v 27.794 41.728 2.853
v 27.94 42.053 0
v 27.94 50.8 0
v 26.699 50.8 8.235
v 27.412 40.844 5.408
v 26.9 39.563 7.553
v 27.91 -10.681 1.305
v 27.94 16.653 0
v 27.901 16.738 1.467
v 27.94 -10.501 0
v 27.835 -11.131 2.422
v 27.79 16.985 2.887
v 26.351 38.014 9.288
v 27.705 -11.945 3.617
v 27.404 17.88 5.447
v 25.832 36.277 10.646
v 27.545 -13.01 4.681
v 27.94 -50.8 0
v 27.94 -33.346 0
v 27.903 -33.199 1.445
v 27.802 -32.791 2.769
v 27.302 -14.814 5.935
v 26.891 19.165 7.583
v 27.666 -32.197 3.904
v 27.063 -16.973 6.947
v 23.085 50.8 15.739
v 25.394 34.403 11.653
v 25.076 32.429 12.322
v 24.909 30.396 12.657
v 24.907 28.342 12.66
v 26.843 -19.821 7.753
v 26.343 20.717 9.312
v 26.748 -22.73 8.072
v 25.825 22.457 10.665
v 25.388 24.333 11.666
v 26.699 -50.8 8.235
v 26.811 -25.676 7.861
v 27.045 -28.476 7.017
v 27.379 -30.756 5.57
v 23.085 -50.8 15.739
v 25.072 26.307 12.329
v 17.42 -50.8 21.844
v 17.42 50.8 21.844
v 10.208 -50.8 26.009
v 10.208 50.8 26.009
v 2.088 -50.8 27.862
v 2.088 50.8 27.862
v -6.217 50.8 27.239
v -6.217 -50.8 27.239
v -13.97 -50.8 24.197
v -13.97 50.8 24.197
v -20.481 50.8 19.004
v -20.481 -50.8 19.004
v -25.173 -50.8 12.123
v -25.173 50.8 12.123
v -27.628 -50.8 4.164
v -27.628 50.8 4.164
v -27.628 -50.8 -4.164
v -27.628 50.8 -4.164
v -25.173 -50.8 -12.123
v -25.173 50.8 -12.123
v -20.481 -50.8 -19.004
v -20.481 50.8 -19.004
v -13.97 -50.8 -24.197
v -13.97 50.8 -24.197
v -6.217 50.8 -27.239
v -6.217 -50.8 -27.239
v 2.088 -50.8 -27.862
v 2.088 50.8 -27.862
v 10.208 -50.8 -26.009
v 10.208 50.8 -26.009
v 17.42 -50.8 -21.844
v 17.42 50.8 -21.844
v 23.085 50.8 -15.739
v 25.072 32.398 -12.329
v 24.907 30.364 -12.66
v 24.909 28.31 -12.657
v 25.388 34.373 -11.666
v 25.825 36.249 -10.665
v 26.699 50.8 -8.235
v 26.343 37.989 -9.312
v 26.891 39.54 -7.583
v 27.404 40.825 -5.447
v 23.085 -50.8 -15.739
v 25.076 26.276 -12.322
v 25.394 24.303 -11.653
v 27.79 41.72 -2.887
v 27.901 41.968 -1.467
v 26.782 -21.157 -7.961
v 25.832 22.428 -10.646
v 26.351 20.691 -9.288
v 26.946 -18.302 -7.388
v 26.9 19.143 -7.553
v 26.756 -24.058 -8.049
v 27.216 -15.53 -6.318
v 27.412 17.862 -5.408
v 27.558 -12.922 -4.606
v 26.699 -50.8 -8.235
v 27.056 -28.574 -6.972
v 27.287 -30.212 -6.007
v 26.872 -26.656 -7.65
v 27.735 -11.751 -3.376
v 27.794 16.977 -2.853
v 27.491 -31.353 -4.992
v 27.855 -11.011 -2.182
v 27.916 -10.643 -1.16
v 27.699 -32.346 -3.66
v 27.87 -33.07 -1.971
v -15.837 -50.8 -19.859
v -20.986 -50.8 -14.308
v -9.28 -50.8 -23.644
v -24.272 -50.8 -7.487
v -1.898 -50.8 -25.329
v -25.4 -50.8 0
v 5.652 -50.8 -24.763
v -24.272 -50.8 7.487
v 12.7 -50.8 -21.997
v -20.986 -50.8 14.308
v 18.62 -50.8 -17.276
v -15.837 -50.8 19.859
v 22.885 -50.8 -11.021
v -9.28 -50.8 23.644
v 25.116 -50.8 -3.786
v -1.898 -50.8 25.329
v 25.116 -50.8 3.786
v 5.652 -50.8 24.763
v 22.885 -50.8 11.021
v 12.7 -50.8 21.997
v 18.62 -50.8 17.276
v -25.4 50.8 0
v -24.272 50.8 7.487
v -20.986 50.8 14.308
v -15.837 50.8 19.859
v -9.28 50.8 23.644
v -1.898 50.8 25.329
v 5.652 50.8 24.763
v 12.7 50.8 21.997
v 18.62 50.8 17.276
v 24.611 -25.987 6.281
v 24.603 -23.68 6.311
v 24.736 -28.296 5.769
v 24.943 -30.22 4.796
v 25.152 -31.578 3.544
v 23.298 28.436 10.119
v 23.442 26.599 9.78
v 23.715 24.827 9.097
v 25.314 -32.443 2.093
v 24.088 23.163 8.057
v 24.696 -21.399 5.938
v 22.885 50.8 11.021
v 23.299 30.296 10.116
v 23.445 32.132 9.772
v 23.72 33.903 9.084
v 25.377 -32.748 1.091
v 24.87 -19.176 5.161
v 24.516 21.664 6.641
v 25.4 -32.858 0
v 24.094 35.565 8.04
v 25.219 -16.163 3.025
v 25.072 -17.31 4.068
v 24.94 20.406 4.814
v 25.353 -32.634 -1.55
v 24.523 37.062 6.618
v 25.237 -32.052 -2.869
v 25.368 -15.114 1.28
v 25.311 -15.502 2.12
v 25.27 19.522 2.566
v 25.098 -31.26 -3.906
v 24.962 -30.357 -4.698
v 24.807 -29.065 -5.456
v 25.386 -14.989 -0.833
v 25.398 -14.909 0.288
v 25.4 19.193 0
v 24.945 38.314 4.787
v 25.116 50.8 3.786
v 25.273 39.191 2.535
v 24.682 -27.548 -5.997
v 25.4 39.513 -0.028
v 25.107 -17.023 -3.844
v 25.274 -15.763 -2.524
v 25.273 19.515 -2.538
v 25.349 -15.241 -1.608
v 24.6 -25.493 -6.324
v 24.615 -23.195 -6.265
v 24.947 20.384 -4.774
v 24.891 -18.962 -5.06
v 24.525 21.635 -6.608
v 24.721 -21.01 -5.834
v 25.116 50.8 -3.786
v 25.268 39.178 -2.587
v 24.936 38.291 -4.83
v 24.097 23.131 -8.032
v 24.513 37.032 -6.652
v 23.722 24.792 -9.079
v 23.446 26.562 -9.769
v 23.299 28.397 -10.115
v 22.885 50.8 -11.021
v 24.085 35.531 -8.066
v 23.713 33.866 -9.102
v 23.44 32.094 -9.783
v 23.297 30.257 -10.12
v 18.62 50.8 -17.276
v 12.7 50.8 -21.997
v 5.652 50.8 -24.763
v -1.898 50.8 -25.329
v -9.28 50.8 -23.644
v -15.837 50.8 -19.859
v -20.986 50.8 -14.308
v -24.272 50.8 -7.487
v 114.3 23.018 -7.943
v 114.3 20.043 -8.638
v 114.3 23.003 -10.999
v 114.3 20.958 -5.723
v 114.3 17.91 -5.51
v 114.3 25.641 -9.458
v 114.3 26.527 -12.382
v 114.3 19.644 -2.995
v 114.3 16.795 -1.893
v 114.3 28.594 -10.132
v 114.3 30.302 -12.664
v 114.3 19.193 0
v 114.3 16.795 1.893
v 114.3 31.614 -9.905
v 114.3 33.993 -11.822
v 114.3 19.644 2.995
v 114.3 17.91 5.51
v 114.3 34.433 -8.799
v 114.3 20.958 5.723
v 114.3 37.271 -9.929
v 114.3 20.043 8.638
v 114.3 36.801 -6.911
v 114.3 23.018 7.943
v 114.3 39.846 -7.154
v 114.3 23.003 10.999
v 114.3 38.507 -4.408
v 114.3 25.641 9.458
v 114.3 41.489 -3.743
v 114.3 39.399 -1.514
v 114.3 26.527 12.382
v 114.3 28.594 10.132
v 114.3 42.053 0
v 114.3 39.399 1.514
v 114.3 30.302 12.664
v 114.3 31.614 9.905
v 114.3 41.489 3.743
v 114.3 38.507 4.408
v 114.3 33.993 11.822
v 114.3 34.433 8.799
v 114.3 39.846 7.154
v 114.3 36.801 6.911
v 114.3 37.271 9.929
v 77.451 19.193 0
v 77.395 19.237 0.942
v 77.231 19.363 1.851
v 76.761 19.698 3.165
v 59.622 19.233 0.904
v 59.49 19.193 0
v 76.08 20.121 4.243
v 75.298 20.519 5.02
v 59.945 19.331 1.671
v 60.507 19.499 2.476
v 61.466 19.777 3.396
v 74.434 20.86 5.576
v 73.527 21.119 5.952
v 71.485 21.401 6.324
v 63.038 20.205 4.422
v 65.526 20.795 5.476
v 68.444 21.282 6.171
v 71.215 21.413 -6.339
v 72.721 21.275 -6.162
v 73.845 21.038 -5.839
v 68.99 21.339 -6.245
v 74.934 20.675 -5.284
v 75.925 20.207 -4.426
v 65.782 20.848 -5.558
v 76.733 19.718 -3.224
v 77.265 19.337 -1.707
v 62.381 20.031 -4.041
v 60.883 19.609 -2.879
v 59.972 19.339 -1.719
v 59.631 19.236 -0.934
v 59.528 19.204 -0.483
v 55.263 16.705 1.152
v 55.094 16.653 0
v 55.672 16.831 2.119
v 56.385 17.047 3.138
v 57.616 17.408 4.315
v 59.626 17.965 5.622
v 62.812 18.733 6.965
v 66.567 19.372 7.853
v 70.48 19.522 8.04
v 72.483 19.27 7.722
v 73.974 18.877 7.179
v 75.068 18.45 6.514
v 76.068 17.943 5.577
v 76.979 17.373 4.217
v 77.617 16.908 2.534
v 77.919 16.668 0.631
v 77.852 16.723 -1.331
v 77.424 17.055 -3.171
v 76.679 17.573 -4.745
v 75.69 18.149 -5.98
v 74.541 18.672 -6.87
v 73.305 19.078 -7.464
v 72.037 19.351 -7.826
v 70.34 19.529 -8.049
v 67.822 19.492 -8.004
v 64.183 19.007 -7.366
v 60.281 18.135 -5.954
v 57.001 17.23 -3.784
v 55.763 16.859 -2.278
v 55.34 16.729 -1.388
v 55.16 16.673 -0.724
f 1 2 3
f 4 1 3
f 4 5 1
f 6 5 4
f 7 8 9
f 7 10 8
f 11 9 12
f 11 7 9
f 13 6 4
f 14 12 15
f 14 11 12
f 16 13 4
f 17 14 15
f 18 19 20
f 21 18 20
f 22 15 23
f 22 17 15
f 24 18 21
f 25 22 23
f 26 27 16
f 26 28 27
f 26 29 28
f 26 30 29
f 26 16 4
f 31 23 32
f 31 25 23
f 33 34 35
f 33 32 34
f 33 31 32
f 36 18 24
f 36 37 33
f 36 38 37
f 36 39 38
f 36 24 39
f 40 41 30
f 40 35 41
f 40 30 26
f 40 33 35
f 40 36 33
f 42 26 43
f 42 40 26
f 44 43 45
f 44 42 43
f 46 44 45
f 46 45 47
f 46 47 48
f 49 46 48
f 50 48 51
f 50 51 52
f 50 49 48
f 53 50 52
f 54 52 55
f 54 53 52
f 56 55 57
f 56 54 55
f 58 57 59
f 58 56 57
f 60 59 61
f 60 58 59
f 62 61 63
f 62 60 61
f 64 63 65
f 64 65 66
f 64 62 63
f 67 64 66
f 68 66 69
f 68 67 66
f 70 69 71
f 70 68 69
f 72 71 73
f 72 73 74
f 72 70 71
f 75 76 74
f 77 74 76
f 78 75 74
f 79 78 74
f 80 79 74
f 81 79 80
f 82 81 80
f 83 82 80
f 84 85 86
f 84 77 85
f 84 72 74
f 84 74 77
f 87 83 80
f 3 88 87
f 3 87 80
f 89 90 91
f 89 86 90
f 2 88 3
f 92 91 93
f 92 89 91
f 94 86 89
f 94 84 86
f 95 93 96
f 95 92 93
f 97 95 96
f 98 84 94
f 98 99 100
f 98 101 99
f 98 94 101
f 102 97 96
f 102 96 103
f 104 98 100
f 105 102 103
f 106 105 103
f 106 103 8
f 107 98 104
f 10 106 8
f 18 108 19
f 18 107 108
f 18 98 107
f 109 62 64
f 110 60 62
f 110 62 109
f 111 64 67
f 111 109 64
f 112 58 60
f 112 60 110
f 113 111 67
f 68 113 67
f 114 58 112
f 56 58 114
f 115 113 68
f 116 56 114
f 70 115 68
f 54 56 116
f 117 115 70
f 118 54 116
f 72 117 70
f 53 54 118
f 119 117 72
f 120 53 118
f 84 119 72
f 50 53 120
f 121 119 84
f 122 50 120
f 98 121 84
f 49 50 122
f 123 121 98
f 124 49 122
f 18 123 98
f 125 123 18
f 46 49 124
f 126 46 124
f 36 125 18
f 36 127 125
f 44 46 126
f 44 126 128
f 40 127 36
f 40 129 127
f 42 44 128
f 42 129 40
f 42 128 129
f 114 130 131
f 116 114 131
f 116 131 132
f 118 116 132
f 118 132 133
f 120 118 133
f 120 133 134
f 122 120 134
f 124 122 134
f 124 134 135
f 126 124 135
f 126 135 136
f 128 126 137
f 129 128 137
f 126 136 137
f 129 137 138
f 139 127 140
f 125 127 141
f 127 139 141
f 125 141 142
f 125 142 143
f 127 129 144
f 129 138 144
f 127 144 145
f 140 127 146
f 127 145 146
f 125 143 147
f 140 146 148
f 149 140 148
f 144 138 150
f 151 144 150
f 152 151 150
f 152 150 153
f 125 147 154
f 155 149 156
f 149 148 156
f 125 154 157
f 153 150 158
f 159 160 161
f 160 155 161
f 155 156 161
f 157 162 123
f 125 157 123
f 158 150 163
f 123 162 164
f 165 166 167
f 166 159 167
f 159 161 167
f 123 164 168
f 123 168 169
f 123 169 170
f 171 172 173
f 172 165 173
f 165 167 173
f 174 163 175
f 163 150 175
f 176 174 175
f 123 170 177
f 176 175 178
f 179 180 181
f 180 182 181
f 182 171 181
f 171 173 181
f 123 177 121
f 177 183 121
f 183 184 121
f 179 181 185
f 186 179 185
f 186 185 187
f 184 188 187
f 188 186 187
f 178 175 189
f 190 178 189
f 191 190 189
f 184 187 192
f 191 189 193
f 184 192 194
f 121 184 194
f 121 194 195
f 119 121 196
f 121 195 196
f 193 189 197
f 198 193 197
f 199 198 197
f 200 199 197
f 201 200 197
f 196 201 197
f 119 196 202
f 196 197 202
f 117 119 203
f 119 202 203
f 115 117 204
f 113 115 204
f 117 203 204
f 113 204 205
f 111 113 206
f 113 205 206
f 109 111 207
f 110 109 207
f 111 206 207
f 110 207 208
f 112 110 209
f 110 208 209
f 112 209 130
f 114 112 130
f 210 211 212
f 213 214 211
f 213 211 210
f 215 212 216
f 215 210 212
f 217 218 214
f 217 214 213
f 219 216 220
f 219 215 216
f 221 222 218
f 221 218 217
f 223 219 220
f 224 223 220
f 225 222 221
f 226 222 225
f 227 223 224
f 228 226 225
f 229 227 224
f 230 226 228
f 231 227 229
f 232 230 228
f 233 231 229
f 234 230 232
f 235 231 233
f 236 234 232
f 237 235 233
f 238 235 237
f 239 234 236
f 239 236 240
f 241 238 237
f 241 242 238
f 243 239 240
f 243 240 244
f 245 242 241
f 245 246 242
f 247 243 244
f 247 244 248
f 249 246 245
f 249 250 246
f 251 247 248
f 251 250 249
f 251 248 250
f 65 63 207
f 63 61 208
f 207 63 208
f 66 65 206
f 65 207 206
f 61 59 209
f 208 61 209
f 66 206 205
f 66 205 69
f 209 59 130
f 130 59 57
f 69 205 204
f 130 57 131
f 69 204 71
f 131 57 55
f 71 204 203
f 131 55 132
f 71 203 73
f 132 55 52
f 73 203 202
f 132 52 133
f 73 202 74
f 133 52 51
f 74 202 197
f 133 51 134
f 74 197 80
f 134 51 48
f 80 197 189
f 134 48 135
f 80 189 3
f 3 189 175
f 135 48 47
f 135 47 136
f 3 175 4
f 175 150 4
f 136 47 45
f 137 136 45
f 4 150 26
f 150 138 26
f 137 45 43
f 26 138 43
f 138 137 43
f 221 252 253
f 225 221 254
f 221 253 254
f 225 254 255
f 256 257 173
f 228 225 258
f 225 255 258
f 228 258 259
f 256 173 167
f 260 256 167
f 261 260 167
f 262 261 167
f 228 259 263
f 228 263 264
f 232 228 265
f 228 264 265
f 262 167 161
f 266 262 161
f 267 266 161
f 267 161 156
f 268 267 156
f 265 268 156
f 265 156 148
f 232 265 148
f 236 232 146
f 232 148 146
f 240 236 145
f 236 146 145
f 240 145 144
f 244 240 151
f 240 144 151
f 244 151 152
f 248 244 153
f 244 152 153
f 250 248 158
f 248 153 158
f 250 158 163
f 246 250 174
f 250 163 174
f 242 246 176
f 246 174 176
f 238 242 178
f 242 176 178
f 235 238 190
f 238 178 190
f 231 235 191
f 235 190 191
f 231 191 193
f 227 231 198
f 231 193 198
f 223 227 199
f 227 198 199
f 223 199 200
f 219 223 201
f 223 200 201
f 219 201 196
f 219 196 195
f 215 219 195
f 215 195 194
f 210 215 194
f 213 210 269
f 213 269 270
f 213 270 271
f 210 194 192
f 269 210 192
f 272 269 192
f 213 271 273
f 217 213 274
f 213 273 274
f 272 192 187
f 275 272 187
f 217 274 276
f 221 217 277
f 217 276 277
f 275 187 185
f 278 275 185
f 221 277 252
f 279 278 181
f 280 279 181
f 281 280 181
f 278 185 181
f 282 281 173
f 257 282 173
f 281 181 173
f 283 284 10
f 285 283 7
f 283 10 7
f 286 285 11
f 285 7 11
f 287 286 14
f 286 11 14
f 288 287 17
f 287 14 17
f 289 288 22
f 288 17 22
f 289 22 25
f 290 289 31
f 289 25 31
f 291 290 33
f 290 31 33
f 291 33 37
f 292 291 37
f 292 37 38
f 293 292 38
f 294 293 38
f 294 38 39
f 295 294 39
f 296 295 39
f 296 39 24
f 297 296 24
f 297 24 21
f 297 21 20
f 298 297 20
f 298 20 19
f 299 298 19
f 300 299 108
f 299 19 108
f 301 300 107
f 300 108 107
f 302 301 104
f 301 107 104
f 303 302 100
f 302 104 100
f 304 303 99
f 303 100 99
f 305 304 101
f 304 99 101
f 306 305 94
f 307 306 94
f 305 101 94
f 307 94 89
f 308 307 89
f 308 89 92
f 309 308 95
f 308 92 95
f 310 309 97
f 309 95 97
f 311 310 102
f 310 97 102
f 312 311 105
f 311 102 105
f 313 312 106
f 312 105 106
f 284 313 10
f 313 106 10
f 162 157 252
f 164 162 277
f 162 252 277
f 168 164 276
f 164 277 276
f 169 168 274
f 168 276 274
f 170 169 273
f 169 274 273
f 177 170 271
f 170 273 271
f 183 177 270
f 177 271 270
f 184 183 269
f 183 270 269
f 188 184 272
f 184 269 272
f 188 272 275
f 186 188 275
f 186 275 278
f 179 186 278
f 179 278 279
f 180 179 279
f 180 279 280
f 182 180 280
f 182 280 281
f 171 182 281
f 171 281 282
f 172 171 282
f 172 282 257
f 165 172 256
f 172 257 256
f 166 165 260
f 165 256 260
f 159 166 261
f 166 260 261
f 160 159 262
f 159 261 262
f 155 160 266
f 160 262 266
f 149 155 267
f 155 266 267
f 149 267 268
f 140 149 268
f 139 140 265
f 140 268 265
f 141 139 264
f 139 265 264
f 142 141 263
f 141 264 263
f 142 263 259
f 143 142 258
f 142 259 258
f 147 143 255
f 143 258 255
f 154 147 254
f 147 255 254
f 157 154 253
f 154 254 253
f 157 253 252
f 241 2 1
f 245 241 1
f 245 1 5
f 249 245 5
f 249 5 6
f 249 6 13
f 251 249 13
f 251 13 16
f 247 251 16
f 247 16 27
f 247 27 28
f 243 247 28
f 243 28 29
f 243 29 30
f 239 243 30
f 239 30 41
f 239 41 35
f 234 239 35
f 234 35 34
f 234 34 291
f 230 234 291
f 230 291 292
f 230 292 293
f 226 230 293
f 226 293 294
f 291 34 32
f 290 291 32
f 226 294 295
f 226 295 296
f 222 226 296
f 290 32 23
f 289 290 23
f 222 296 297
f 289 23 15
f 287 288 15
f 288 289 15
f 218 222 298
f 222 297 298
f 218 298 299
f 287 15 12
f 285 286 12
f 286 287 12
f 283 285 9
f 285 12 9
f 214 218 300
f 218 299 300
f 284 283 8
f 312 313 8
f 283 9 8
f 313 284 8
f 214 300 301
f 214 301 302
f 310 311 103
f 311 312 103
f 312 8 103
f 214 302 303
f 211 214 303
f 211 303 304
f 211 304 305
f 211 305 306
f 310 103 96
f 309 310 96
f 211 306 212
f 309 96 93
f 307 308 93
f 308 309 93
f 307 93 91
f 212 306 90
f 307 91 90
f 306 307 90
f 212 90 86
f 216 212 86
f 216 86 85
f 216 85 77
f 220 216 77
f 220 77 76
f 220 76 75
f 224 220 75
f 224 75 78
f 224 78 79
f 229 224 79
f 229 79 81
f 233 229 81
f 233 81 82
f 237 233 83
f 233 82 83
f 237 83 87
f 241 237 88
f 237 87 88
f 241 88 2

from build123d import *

# Parameters (mm, degrees)
F0_R      = 27.94
F1_DEPTH  = 50.8
F2_R      = 12.7
F3_DEPTH  = 114.3
F6_R      = 8.0768917326
F7_DEPTH  = 97.32637
F9_D      = 20.32
F9_DEPTH  = 127
F9_TIP    = 6.1047438893
F11_D     = 50.8
F11_DEPTH = 127
F11_TIP   = 15.2618597233
F13_D     = 12.7
F13_DEPTH = 93.98
F13_TIP   = 3.8154649308


with BuildPart() as f1:
    # F0 (on Front) → F1 (new body, symmetric)
    with BuildSketch(Plane.XZ):
        Circle(F0_R)
    extrude(amount=F1_DEPTH, both=True)

    # F2 (on Right) → F3 (join)
    with BuildSketch(Plane.YZ):
        with Locations((29.3527785689, 0)):
            Circle(F2_R)
    extrude(amount=F3_DEPTH)

    # F6 (on face) → F7 (join)
    with BuildSketch(Plane(origin=(-14.9178076535, -14.9178076535, 0), x_dir=(-0.7071067812, 0.7071067812, 0), z_dir=(0.7071067812, 0.7071067812, 0))):
        with Locations((-35.2585986257, 0)):
            Circle(F6_R)
    extrude(amount=F7_DEPTH)

    # F9
    with Locations(Plane.YZ.offset(114.3)):
        with Locations((29.3527785689, 0)):
            Hole(F9_D / 2, depth=F9_DEPTH)
            with Locations((0, 0, -(F9_DEPTH + F9_TIP / 2))):  # 118° drill point
                Cone(0, F9_D / 2, F9_TIP, mode=Mode.SUBTRACT)

    # F11
    with Locations(Plane.XZ.offset(50.8)):
        with Locations((0, 0)):
            Hole(F11_D / 2, depth=F11_DEPTH)
            with Locations((0, 0, -(F11_DEPTH + F11_TIP / 2))):  # 118° drill point
                Cone(0, F11_D / 2, F11_TIP, mode=Mode.SUBTRACT)

    # F13
    with Locations(Plane(origin=(-14.9178076535, -14.9178076535, 0), x_dir=(-0.7071067812, 0.7071067812, 0), z_dir=(-0.7071067812, -0.7071067812, 0))):
        with Locations((-34.8447375, 0)):
            Hole(F13_D / 2, depth=F13_DEPTH)
            with Locations((0, 0, -(F13_DEPTH + F13_TIP / 2))):  # 118° drill point
                Cone(0, F13_D / 2, F13_TIP, mode=Mode.SUBTRACT)


solid = f1.part
